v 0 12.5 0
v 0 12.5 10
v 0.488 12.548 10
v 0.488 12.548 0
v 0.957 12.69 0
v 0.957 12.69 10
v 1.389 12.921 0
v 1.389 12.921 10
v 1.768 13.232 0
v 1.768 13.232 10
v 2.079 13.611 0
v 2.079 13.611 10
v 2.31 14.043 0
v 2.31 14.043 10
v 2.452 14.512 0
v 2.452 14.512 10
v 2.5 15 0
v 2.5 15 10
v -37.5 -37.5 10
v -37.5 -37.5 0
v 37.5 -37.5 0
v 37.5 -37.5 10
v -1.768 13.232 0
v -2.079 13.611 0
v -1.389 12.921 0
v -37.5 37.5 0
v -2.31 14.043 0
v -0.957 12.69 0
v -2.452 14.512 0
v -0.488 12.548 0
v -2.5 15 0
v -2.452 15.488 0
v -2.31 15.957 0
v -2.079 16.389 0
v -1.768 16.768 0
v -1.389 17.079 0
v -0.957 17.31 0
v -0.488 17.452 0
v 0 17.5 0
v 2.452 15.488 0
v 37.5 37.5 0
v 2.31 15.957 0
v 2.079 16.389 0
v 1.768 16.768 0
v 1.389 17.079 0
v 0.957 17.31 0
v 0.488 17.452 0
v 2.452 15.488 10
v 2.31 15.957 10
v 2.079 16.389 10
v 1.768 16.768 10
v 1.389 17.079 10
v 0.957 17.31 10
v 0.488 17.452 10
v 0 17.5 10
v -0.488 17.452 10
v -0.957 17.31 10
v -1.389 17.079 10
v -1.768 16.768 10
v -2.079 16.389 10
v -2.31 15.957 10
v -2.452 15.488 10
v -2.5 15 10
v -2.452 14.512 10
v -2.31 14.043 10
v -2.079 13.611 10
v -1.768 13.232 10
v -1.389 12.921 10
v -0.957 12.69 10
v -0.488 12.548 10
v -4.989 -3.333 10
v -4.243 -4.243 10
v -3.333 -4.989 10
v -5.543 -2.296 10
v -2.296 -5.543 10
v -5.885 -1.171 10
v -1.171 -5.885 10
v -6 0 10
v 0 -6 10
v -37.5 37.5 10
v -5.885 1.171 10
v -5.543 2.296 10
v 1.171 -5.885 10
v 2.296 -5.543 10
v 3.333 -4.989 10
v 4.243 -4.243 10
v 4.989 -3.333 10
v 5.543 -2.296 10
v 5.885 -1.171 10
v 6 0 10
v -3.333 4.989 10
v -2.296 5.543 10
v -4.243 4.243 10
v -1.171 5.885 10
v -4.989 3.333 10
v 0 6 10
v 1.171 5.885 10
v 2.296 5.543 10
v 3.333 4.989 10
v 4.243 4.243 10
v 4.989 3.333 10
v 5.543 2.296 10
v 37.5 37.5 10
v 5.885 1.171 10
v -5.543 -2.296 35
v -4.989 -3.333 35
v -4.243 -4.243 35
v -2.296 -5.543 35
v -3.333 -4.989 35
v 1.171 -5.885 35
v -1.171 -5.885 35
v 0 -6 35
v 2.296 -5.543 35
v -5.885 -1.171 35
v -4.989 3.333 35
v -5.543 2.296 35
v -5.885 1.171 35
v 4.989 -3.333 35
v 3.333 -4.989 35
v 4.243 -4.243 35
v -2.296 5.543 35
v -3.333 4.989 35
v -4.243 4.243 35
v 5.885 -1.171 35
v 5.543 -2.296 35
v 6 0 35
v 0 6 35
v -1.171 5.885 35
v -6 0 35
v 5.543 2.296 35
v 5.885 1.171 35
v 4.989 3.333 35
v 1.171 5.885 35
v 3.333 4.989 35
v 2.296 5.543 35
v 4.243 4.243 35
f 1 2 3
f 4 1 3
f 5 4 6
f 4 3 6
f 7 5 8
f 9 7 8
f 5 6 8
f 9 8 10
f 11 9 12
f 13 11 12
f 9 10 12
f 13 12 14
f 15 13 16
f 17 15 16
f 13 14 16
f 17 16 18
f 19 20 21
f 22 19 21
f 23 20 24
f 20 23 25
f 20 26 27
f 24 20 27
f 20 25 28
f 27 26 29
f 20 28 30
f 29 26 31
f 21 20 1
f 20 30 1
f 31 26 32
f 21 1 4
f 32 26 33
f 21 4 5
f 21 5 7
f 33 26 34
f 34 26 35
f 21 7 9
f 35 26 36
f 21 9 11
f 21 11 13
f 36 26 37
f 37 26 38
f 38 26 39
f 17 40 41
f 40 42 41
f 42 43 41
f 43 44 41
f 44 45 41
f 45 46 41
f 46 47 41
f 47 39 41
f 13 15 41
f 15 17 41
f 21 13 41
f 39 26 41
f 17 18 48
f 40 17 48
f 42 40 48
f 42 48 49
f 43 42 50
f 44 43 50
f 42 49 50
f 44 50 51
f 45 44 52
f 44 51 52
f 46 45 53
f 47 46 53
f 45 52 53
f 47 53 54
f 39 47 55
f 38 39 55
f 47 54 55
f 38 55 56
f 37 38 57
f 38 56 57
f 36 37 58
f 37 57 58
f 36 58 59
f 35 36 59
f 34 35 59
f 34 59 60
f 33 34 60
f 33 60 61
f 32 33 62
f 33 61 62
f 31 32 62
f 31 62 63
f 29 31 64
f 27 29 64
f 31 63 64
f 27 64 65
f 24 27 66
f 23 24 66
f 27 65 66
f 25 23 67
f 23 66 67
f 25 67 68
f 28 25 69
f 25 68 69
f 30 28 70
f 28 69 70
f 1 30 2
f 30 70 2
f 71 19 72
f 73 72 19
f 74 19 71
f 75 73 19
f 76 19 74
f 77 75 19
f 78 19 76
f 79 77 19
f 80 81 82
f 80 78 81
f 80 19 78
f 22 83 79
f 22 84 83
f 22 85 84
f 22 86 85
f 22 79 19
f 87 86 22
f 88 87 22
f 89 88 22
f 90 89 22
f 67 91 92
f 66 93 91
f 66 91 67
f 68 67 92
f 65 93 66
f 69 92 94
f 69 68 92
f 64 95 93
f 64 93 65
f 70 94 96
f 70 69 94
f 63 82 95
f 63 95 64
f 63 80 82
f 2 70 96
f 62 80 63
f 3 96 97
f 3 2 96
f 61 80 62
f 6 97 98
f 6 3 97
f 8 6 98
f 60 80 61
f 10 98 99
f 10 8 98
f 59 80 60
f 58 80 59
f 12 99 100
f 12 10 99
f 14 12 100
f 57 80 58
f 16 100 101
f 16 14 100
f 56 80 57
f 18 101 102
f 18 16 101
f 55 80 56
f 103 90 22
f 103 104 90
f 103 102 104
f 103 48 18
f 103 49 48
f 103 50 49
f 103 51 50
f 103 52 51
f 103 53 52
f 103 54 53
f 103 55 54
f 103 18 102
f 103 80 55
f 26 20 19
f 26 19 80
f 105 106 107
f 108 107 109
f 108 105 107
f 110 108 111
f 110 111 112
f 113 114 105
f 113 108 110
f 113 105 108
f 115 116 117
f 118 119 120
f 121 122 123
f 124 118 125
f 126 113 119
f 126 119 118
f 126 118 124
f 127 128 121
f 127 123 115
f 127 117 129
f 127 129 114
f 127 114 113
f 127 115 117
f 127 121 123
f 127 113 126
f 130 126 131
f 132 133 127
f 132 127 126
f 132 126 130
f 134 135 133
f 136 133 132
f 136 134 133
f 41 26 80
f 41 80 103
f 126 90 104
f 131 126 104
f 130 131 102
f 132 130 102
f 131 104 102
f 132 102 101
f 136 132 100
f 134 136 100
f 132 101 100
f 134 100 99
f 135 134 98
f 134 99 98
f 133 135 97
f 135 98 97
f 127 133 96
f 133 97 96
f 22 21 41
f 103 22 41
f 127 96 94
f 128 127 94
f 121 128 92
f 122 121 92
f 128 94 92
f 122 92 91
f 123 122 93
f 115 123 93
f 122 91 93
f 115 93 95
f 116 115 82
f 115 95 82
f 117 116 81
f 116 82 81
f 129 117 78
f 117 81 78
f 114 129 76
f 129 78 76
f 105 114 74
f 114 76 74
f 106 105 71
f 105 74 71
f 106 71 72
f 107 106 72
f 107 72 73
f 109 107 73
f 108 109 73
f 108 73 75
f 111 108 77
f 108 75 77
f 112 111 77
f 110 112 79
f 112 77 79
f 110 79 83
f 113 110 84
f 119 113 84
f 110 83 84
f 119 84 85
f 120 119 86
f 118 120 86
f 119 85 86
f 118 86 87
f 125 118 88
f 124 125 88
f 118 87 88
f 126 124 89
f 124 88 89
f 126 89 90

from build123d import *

# Parameters (mm, degrees)
F0_W     = 75
F0_H     = 75
F1_DEPTH = 10
F3_DEPTH = 25
F4_DEPTH = 10


with BuildPart() as f1:
    # F0 (on Top) → F1 (new body)
    with BuildSketch(Plane.XY):
        Rectangle(F0_W, F0_H)
    extrude(amount=F1_DEPTH)

    # F2 (on face) → F3 (join)
    with BuildSketch(Plane.XY.offset(10)):
        with BuildLine():
            ThreePointArc((0, 6), (-4.242641, -4.242641), (6, 0))
            ThreePointArc((6, 0), (4.242641, 4.242641), (0, 6))
        make_face()
    extrude(amount=F3_DEPTH)

    # F2 (on face) → F4 (cut)
    with BuildSketch(Plane.XY.offset(10)):
        with BuildLine():
            ThreePointArc((2.5, 15), (-1.767767, 16.767767), (0, 12.5))
            ThreePointArc((0, 12.5), (1.767767, 13.232233), (2.5, 15))
        make_face()
    extrude(amount=-F4_DEPTH, mode=Mode.SUBTRACT)


solid = f1.part
